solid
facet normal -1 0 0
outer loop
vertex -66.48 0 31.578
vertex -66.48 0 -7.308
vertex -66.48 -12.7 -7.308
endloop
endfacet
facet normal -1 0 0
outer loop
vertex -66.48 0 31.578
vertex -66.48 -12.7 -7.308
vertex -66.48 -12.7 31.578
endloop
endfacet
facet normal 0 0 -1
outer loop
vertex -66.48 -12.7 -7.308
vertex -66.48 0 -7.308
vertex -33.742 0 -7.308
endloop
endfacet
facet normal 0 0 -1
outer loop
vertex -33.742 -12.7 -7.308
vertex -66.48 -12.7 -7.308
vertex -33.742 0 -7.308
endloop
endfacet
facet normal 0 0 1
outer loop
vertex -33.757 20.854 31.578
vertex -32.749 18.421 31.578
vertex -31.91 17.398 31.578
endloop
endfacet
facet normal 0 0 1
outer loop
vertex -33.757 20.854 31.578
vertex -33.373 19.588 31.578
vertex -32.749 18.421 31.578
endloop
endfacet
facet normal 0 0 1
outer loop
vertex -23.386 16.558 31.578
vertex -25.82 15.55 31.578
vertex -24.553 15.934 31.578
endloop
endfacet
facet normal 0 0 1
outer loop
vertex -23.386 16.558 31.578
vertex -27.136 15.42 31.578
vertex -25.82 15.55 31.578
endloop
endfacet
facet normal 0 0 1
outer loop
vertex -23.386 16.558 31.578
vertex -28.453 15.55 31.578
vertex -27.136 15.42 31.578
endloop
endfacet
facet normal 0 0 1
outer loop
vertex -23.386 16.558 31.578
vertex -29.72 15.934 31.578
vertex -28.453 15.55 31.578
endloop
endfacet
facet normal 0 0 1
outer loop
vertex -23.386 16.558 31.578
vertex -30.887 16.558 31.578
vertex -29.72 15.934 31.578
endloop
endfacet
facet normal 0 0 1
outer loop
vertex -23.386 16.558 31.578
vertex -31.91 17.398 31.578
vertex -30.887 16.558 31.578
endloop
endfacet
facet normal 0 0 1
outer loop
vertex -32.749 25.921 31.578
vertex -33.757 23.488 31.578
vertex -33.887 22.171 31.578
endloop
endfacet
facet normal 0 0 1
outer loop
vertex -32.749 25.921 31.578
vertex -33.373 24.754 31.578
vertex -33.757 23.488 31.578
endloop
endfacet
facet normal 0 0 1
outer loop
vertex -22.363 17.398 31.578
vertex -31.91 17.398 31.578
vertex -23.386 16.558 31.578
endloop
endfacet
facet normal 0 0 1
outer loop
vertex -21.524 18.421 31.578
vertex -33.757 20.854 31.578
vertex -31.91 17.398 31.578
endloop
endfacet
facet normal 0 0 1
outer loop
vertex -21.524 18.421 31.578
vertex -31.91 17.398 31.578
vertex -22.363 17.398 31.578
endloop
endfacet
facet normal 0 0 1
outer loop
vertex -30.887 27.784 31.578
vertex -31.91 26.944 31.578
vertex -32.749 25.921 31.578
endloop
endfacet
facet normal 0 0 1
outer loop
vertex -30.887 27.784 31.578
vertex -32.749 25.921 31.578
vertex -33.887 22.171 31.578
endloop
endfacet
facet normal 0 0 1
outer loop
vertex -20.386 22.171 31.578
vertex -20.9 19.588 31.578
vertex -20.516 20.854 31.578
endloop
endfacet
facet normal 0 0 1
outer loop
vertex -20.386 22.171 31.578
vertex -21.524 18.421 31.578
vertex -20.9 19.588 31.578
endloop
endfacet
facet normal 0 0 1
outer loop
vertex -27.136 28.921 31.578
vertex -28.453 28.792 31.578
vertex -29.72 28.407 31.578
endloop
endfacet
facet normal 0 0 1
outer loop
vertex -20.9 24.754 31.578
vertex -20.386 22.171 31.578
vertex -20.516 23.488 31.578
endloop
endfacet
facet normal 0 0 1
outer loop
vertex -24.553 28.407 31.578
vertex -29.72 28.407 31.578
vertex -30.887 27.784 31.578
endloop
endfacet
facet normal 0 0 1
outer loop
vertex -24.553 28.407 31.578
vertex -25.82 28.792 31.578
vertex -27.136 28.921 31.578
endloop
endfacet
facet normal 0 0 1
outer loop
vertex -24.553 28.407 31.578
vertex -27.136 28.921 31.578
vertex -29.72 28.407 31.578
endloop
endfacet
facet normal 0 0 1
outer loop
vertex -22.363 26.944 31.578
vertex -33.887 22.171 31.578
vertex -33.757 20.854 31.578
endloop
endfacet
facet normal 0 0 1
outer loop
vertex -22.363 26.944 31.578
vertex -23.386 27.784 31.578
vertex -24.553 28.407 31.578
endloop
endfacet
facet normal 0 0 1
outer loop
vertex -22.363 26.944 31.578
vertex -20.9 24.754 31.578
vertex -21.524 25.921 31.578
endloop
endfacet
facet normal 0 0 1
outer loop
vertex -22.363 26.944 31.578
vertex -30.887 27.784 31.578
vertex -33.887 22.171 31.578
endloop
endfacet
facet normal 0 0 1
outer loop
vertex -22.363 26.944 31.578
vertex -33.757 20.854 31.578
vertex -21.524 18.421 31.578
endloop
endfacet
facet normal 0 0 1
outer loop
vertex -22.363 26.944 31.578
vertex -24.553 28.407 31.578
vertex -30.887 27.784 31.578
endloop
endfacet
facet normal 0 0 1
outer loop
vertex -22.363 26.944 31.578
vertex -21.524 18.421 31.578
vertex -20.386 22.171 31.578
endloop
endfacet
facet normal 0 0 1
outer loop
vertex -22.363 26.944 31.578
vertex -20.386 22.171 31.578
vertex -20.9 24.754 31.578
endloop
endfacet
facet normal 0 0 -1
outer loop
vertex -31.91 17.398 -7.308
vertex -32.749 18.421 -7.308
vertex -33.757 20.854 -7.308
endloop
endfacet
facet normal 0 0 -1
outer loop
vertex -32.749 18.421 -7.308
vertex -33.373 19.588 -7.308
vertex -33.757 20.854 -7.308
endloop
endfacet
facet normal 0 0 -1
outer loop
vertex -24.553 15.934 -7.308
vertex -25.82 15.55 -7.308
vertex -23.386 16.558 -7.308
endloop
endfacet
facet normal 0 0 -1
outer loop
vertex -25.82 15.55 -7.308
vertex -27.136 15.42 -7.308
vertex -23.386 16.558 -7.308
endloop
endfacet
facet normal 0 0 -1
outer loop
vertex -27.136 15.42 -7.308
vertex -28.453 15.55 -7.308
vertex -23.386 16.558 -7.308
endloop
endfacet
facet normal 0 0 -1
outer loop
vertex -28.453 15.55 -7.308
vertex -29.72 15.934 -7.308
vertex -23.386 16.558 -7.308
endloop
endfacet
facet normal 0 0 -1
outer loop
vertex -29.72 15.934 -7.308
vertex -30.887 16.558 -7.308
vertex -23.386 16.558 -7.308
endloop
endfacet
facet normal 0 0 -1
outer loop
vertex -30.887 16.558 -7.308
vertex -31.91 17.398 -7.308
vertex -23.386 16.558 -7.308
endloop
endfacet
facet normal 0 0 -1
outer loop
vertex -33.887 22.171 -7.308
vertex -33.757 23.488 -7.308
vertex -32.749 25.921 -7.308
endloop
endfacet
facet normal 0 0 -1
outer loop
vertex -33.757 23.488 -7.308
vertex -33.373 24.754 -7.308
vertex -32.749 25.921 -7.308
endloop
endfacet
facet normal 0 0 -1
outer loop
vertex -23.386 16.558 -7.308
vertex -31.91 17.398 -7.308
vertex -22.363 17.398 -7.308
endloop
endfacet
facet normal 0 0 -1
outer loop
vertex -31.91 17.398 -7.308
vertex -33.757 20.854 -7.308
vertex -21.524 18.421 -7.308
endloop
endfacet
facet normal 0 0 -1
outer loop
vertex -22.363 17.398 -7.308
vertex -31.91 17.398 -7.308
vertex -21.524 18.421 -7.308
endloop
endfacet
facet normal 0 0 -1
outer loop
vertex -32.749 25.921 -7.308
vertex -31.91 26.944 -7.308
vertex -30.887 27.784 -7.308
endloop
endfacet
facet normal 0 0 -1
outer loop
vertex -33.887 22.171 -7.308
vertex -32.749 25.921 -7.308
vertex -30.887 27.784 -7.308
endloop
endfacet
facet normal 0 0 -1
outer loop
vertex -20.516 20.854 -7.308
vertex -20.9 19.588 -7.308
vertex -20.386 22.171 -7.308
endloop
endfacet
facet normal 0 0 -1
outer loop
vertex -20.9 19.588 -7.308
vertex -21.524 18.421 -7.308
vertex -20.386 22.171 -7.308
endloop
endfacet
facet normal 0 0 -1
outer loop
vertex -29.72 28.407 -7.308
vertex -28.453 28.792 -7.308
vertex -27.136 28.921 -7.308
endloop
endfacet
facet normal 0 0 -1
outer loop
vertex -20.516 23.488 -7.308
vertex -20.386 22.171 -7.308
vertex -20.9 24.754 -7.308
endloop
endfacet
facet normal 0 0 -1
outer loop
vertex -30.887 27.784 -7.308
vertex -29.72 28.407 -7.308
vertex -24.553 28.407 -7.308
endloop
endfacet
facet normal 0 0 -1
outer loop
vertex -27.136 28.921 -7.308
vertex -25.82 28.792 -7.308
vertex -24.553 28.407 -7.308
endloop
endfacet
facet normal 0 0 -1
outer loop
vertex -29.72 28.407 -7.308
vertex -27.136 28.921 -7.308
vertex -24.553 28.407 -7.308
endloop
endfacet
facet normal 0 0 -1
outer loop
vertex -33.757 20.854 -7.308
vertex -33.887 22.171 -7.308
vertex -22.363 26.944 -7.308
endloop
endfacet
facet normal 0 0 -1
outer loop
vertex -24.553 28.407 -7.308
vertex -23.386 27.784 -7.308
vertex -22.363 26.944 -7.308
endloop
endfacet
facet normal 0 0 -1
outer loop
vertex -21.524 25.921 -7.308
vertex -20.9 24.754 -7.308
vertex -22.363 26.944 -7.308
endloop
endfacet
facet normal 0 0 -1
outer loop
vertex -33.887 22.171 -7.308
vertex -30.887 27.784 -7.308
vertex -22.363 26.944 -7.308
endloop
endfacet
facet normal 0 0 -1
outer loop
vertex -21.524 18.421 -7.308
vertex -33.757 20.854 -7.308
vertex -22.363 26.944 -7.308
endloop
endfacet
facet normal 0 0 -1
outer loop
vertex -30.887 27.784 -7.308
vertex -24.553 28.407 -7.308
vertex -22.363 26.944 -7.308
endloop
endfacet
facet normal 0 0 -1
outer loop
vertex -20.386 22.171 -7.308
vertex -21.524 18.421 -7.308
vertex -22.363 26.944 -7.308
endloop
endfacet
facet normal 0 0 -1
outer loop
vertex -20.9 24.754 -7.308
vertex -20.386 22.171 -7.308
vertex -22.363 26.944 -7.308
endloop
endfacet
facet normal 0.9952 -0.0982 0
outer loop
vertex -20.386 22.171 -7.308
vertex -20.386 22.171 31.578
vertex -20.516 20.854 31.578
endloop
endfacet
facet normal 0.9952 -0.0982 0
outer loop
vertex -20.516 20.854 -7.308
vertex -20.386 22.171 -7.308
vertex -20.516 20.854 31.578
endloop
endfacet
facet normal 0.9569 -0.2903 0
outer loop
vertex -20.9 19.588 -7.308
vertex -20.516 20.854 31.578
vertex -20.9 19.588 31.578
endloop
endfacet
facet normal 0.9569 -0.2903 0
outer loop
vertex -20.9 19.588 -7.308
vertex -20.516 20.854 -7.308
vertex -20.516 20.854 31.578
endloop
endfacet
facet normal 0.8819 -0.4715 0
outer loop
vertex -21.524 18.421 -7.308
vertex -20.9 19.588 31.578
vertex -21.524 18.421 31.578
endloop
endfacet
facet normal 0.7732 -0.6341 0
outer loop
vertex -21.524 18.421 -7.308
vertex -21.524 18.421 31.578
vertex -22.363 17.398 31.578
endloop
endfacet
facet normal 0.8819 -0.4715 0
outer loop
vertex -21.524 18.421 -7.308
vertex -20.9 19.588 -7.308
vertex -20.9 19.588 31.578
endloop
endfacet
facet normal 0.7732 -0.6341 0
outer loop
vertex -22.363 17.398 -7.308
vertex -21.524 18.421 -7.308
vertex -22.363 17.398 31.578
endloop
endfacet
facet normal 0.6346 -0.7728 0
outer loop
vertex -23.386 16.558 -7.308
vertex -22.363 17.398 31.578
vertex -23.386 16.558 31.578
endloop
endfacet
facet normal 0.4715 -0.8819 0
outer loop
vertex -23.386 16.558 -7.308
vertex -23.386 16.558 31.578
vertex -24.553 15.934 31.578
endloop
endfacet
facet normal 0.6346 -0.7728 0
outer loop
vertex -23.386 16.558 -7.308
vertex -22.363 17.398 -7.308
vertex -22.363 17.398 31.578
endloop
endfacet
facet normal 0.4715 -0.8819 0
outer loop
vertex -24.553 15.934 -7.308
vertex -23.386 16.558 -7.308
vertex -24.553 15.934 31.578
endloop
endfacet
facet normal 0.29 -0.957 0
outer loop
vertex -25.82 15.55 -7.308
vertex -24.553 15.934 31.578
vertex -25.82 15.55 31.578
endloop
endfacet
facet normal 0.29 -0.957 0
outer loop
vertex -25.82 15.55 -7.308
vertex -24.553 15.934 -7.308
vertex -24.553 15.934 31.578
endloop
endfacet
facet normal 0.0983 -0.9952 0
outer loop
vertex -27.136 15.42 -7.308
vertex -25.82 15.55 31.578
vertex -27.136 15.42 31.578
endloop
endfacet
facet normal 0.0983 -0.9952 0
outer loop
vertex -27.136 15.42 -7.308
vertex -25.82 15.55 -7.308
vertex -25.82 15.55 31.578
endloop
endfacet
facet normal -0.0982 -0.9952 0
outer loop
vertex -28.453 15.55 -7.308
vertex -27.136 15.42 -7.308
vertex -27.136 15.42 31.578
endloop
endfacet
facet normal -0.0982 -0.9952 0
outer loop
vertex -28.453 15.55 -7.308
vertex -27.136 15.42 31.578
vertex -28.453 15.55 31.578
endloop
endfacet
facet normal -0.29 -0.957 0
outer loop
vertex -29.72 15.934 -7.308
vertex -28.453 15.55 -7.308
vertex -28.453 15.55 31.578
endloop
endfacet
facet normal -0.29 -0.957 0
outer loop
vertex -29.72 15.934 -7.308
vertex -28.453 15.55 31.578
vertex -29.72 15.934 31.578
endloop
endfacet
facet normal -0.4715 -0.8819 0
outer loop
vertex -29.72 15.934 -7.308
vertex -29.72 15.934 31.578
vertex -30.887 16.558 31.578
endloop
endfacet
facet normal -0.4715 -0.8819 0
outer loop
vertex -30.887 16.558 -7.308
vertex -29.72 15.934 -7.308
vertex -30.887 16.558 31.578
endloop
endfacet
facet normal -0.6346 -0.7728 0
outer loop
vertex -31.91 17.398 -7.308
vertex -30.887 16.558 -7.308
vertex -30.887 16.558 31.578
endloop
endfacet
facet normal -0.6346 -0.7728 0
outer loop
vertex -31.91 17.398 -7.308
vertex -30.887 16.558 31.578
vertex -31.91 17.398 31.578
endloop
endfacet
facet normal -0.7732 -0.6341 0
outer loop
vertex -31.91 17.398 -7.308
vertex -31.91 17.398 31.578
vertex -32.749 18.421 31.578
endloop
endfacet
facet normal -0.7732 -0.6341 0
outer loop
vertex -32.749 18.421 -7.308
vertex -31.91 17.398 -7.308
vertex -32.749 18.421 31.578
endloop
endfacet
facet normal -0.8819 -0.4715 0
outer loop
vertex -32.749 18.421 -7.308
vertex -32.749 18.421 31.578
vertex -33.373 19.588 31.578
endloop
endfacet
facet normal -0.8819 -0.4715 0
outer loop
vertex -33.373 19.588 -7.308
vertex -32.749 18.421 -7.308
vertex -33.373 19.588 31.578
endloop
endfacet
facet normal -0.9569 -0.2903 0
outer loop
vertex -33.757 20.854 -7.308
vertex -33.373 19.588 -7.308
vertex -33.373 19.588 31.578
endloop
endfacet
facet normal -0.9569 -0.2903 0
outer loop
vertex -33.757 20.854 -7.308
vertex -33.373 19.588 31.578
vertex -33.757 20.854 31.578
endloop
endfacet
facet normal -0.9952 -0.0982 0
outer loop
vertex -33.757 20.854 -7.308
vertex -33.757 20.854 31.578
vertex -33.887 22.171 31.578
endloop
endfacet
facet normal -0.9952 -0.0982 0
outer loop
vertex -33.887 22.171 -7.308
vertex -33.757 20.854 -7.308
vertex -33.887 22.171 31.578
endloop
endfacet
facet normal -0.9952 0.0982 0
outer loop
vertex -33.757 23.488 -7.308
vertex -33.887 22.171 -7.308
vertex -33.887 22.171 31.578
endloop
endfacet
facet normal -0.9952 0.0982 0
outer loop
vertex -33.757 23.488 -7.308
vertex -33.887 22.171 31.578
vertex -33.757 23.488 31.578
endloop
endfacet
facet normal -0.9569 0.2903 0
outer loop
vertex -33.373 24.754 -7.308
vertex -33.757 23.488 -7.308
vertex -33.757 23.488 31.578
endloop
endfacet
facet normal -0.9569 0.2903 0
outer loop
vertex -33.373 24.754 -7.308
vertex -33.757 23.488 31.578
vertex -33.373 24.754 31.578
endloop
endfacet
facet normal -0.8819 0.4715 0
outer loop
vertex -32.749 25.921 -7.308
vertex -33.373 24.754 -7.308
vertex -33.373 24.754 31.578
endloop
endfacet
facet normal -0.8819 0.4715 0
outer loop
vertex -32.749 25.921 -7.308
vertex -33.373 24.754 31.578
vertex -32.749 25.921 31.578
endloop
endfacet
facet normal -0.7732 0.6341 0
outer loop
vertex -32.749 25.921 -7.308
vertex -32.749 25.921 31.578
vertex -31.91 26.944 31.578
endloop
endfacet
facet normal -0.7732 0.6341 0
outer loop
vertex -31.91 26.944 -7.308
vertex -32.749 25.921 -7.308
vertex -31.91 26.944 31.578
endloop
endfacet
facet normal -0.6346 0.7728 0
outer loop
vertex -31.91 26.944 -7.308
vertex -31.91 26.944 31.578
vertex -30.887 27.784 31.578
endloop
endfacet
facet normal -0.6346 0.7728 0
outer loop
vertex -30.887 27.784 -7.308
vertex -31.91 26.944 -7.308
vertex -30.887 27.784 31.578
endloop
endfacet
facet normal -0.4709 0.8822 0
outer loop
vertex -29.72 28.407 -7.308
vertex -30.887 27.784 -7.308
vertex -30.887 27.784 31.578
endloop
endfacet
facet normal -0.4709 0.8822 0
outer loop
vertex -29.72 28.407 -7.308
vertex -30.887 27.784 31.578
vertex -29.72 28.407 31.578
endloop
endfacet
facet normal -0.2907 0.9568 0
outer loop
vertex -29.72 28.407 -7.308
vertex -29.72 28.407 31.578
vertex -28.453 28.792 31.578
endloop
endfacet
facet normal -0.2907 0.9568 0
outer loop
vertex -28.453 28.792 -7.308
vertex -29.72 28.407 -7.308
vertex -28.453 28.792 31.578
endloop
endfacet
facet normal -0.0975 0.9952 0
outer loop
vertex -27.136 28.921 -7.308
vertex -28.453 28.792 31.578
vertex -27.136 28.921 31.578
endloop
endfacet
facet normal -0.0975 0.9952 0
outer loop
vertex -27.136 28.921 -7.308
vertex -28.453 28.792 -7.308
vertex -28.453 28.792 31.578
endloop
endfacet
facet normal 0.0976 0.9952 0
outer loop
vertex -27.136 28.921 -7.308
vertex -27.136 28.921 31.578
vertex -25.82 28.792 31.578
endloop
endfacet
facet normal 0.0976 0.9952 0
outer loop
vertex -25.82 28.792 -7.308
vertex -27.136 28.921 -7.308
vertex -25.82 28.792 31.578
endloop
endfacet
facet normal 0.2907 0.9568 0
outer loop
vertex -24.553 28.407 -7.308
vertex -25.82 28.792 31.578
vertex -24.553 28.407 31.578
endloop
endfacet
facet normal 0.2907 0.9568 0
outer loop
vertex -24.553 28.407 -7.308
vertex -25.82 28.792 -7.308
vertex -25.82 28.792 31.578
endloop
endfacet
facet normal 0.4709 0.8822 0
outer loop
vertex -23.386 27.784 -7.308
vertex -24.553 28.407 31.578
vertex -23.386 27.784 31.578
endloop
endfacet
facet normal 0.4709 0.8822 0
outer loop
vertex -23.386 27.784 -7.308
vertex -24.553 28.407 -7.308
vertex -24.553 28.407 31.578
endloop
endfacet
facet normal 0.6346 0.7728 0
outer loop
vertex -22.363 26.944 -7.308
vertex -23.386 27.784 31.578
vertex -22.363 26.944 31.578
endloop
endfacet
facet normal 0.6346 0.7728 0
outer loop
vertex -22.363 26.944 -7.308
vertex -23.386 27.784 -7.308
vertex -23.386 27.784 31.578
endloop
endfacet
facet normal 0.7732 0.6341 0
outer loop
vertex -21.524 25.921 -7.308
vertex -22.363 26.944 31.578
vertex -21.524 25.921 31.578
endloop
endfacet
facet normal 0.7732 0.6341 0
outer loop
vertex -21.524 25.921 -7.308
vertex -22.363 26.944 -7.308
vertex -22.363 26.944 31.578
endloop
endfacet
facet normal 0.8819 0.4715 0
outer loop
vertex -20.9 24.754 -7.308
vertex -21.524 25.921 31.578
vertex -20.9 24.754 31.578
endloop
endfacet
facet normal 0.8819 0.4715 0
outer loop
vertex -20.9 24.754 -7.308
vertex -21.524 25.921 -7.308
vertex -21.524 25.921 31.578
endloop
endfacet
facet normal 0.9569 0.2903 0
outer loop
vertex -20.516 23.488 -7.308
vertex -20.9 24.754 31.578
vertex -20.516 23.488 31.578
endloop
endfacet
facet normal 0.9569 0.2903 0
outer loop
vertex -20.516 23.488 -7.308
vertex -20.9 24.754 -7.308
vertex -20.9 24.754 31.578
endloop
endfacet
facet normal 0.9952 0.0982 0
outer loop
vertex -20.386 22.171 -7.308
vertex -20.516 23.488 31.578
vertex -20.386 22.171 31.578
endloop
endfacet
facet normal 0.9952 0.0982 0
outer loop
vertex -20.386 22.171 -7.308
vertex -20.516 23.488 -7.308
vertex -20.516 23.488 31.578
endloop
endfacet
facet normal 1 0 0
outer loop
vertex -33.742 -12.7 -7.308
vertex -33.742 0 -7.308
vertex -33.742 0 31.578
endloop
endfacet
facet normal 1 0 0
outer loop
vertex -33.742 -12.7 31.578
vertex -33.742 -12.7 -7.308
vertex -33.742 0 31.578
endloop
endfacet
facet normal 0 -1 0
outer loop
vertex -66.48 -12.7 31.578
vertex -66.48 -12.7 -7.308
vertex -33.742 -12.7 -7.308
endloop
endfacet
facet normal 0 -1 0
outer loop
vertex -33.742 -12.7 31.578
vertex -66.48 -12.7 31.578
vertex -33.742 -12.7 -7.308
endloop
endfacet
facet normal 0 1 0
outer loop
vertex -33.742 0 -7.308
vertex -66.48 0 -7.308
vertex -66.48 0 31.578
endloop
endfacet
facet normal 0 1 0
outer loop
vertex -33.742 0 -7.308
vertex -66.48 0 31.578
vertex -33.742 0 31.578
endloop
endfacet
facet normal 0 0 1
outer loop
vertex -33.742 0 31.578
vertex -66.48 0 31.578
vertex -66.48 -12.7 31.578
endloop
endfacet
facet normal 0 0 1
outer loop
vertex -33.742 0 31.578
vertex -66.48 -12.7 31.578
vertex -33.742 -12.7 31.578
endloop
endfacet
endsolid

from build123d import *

# Parameters (mm, degrees)
F0_W     = 32.738879323
F0_H     = 38.8862430118
F1_DEPTH = 12.7
F2_R     = 6.7503897368


with BuildPart() as f1:
    # F0 (on Front) → F1 (new body)
    with BuildSketch(Plane.XZ):
        with Locations((-50.1110106707, 12.1353298891)):
            Rectangle(F0_W, F0_H)
    extrude(amount=F1_DEPTH)


with BuildPart() as f3:
    # F3: sweep along a path in F3_path
    with BuildLine(Plane(origin=(-33.7415710092, 0, 31.578451395), x_dir=(0, 0, 1), z_dir=(0, -1, 0))) as f3_path:
        Line((0, 0), (-38.8862430118, 0))
    # F2 (on Top) → F3 (sweep)
    with BuildSketch(Plane.XY):
        with Locations((-27.1364916116, 22.1708789468)):
            Circle(F2_R)
    sweep(path=f3_path.line)


solid = Compound([f1.part, f3.part])
